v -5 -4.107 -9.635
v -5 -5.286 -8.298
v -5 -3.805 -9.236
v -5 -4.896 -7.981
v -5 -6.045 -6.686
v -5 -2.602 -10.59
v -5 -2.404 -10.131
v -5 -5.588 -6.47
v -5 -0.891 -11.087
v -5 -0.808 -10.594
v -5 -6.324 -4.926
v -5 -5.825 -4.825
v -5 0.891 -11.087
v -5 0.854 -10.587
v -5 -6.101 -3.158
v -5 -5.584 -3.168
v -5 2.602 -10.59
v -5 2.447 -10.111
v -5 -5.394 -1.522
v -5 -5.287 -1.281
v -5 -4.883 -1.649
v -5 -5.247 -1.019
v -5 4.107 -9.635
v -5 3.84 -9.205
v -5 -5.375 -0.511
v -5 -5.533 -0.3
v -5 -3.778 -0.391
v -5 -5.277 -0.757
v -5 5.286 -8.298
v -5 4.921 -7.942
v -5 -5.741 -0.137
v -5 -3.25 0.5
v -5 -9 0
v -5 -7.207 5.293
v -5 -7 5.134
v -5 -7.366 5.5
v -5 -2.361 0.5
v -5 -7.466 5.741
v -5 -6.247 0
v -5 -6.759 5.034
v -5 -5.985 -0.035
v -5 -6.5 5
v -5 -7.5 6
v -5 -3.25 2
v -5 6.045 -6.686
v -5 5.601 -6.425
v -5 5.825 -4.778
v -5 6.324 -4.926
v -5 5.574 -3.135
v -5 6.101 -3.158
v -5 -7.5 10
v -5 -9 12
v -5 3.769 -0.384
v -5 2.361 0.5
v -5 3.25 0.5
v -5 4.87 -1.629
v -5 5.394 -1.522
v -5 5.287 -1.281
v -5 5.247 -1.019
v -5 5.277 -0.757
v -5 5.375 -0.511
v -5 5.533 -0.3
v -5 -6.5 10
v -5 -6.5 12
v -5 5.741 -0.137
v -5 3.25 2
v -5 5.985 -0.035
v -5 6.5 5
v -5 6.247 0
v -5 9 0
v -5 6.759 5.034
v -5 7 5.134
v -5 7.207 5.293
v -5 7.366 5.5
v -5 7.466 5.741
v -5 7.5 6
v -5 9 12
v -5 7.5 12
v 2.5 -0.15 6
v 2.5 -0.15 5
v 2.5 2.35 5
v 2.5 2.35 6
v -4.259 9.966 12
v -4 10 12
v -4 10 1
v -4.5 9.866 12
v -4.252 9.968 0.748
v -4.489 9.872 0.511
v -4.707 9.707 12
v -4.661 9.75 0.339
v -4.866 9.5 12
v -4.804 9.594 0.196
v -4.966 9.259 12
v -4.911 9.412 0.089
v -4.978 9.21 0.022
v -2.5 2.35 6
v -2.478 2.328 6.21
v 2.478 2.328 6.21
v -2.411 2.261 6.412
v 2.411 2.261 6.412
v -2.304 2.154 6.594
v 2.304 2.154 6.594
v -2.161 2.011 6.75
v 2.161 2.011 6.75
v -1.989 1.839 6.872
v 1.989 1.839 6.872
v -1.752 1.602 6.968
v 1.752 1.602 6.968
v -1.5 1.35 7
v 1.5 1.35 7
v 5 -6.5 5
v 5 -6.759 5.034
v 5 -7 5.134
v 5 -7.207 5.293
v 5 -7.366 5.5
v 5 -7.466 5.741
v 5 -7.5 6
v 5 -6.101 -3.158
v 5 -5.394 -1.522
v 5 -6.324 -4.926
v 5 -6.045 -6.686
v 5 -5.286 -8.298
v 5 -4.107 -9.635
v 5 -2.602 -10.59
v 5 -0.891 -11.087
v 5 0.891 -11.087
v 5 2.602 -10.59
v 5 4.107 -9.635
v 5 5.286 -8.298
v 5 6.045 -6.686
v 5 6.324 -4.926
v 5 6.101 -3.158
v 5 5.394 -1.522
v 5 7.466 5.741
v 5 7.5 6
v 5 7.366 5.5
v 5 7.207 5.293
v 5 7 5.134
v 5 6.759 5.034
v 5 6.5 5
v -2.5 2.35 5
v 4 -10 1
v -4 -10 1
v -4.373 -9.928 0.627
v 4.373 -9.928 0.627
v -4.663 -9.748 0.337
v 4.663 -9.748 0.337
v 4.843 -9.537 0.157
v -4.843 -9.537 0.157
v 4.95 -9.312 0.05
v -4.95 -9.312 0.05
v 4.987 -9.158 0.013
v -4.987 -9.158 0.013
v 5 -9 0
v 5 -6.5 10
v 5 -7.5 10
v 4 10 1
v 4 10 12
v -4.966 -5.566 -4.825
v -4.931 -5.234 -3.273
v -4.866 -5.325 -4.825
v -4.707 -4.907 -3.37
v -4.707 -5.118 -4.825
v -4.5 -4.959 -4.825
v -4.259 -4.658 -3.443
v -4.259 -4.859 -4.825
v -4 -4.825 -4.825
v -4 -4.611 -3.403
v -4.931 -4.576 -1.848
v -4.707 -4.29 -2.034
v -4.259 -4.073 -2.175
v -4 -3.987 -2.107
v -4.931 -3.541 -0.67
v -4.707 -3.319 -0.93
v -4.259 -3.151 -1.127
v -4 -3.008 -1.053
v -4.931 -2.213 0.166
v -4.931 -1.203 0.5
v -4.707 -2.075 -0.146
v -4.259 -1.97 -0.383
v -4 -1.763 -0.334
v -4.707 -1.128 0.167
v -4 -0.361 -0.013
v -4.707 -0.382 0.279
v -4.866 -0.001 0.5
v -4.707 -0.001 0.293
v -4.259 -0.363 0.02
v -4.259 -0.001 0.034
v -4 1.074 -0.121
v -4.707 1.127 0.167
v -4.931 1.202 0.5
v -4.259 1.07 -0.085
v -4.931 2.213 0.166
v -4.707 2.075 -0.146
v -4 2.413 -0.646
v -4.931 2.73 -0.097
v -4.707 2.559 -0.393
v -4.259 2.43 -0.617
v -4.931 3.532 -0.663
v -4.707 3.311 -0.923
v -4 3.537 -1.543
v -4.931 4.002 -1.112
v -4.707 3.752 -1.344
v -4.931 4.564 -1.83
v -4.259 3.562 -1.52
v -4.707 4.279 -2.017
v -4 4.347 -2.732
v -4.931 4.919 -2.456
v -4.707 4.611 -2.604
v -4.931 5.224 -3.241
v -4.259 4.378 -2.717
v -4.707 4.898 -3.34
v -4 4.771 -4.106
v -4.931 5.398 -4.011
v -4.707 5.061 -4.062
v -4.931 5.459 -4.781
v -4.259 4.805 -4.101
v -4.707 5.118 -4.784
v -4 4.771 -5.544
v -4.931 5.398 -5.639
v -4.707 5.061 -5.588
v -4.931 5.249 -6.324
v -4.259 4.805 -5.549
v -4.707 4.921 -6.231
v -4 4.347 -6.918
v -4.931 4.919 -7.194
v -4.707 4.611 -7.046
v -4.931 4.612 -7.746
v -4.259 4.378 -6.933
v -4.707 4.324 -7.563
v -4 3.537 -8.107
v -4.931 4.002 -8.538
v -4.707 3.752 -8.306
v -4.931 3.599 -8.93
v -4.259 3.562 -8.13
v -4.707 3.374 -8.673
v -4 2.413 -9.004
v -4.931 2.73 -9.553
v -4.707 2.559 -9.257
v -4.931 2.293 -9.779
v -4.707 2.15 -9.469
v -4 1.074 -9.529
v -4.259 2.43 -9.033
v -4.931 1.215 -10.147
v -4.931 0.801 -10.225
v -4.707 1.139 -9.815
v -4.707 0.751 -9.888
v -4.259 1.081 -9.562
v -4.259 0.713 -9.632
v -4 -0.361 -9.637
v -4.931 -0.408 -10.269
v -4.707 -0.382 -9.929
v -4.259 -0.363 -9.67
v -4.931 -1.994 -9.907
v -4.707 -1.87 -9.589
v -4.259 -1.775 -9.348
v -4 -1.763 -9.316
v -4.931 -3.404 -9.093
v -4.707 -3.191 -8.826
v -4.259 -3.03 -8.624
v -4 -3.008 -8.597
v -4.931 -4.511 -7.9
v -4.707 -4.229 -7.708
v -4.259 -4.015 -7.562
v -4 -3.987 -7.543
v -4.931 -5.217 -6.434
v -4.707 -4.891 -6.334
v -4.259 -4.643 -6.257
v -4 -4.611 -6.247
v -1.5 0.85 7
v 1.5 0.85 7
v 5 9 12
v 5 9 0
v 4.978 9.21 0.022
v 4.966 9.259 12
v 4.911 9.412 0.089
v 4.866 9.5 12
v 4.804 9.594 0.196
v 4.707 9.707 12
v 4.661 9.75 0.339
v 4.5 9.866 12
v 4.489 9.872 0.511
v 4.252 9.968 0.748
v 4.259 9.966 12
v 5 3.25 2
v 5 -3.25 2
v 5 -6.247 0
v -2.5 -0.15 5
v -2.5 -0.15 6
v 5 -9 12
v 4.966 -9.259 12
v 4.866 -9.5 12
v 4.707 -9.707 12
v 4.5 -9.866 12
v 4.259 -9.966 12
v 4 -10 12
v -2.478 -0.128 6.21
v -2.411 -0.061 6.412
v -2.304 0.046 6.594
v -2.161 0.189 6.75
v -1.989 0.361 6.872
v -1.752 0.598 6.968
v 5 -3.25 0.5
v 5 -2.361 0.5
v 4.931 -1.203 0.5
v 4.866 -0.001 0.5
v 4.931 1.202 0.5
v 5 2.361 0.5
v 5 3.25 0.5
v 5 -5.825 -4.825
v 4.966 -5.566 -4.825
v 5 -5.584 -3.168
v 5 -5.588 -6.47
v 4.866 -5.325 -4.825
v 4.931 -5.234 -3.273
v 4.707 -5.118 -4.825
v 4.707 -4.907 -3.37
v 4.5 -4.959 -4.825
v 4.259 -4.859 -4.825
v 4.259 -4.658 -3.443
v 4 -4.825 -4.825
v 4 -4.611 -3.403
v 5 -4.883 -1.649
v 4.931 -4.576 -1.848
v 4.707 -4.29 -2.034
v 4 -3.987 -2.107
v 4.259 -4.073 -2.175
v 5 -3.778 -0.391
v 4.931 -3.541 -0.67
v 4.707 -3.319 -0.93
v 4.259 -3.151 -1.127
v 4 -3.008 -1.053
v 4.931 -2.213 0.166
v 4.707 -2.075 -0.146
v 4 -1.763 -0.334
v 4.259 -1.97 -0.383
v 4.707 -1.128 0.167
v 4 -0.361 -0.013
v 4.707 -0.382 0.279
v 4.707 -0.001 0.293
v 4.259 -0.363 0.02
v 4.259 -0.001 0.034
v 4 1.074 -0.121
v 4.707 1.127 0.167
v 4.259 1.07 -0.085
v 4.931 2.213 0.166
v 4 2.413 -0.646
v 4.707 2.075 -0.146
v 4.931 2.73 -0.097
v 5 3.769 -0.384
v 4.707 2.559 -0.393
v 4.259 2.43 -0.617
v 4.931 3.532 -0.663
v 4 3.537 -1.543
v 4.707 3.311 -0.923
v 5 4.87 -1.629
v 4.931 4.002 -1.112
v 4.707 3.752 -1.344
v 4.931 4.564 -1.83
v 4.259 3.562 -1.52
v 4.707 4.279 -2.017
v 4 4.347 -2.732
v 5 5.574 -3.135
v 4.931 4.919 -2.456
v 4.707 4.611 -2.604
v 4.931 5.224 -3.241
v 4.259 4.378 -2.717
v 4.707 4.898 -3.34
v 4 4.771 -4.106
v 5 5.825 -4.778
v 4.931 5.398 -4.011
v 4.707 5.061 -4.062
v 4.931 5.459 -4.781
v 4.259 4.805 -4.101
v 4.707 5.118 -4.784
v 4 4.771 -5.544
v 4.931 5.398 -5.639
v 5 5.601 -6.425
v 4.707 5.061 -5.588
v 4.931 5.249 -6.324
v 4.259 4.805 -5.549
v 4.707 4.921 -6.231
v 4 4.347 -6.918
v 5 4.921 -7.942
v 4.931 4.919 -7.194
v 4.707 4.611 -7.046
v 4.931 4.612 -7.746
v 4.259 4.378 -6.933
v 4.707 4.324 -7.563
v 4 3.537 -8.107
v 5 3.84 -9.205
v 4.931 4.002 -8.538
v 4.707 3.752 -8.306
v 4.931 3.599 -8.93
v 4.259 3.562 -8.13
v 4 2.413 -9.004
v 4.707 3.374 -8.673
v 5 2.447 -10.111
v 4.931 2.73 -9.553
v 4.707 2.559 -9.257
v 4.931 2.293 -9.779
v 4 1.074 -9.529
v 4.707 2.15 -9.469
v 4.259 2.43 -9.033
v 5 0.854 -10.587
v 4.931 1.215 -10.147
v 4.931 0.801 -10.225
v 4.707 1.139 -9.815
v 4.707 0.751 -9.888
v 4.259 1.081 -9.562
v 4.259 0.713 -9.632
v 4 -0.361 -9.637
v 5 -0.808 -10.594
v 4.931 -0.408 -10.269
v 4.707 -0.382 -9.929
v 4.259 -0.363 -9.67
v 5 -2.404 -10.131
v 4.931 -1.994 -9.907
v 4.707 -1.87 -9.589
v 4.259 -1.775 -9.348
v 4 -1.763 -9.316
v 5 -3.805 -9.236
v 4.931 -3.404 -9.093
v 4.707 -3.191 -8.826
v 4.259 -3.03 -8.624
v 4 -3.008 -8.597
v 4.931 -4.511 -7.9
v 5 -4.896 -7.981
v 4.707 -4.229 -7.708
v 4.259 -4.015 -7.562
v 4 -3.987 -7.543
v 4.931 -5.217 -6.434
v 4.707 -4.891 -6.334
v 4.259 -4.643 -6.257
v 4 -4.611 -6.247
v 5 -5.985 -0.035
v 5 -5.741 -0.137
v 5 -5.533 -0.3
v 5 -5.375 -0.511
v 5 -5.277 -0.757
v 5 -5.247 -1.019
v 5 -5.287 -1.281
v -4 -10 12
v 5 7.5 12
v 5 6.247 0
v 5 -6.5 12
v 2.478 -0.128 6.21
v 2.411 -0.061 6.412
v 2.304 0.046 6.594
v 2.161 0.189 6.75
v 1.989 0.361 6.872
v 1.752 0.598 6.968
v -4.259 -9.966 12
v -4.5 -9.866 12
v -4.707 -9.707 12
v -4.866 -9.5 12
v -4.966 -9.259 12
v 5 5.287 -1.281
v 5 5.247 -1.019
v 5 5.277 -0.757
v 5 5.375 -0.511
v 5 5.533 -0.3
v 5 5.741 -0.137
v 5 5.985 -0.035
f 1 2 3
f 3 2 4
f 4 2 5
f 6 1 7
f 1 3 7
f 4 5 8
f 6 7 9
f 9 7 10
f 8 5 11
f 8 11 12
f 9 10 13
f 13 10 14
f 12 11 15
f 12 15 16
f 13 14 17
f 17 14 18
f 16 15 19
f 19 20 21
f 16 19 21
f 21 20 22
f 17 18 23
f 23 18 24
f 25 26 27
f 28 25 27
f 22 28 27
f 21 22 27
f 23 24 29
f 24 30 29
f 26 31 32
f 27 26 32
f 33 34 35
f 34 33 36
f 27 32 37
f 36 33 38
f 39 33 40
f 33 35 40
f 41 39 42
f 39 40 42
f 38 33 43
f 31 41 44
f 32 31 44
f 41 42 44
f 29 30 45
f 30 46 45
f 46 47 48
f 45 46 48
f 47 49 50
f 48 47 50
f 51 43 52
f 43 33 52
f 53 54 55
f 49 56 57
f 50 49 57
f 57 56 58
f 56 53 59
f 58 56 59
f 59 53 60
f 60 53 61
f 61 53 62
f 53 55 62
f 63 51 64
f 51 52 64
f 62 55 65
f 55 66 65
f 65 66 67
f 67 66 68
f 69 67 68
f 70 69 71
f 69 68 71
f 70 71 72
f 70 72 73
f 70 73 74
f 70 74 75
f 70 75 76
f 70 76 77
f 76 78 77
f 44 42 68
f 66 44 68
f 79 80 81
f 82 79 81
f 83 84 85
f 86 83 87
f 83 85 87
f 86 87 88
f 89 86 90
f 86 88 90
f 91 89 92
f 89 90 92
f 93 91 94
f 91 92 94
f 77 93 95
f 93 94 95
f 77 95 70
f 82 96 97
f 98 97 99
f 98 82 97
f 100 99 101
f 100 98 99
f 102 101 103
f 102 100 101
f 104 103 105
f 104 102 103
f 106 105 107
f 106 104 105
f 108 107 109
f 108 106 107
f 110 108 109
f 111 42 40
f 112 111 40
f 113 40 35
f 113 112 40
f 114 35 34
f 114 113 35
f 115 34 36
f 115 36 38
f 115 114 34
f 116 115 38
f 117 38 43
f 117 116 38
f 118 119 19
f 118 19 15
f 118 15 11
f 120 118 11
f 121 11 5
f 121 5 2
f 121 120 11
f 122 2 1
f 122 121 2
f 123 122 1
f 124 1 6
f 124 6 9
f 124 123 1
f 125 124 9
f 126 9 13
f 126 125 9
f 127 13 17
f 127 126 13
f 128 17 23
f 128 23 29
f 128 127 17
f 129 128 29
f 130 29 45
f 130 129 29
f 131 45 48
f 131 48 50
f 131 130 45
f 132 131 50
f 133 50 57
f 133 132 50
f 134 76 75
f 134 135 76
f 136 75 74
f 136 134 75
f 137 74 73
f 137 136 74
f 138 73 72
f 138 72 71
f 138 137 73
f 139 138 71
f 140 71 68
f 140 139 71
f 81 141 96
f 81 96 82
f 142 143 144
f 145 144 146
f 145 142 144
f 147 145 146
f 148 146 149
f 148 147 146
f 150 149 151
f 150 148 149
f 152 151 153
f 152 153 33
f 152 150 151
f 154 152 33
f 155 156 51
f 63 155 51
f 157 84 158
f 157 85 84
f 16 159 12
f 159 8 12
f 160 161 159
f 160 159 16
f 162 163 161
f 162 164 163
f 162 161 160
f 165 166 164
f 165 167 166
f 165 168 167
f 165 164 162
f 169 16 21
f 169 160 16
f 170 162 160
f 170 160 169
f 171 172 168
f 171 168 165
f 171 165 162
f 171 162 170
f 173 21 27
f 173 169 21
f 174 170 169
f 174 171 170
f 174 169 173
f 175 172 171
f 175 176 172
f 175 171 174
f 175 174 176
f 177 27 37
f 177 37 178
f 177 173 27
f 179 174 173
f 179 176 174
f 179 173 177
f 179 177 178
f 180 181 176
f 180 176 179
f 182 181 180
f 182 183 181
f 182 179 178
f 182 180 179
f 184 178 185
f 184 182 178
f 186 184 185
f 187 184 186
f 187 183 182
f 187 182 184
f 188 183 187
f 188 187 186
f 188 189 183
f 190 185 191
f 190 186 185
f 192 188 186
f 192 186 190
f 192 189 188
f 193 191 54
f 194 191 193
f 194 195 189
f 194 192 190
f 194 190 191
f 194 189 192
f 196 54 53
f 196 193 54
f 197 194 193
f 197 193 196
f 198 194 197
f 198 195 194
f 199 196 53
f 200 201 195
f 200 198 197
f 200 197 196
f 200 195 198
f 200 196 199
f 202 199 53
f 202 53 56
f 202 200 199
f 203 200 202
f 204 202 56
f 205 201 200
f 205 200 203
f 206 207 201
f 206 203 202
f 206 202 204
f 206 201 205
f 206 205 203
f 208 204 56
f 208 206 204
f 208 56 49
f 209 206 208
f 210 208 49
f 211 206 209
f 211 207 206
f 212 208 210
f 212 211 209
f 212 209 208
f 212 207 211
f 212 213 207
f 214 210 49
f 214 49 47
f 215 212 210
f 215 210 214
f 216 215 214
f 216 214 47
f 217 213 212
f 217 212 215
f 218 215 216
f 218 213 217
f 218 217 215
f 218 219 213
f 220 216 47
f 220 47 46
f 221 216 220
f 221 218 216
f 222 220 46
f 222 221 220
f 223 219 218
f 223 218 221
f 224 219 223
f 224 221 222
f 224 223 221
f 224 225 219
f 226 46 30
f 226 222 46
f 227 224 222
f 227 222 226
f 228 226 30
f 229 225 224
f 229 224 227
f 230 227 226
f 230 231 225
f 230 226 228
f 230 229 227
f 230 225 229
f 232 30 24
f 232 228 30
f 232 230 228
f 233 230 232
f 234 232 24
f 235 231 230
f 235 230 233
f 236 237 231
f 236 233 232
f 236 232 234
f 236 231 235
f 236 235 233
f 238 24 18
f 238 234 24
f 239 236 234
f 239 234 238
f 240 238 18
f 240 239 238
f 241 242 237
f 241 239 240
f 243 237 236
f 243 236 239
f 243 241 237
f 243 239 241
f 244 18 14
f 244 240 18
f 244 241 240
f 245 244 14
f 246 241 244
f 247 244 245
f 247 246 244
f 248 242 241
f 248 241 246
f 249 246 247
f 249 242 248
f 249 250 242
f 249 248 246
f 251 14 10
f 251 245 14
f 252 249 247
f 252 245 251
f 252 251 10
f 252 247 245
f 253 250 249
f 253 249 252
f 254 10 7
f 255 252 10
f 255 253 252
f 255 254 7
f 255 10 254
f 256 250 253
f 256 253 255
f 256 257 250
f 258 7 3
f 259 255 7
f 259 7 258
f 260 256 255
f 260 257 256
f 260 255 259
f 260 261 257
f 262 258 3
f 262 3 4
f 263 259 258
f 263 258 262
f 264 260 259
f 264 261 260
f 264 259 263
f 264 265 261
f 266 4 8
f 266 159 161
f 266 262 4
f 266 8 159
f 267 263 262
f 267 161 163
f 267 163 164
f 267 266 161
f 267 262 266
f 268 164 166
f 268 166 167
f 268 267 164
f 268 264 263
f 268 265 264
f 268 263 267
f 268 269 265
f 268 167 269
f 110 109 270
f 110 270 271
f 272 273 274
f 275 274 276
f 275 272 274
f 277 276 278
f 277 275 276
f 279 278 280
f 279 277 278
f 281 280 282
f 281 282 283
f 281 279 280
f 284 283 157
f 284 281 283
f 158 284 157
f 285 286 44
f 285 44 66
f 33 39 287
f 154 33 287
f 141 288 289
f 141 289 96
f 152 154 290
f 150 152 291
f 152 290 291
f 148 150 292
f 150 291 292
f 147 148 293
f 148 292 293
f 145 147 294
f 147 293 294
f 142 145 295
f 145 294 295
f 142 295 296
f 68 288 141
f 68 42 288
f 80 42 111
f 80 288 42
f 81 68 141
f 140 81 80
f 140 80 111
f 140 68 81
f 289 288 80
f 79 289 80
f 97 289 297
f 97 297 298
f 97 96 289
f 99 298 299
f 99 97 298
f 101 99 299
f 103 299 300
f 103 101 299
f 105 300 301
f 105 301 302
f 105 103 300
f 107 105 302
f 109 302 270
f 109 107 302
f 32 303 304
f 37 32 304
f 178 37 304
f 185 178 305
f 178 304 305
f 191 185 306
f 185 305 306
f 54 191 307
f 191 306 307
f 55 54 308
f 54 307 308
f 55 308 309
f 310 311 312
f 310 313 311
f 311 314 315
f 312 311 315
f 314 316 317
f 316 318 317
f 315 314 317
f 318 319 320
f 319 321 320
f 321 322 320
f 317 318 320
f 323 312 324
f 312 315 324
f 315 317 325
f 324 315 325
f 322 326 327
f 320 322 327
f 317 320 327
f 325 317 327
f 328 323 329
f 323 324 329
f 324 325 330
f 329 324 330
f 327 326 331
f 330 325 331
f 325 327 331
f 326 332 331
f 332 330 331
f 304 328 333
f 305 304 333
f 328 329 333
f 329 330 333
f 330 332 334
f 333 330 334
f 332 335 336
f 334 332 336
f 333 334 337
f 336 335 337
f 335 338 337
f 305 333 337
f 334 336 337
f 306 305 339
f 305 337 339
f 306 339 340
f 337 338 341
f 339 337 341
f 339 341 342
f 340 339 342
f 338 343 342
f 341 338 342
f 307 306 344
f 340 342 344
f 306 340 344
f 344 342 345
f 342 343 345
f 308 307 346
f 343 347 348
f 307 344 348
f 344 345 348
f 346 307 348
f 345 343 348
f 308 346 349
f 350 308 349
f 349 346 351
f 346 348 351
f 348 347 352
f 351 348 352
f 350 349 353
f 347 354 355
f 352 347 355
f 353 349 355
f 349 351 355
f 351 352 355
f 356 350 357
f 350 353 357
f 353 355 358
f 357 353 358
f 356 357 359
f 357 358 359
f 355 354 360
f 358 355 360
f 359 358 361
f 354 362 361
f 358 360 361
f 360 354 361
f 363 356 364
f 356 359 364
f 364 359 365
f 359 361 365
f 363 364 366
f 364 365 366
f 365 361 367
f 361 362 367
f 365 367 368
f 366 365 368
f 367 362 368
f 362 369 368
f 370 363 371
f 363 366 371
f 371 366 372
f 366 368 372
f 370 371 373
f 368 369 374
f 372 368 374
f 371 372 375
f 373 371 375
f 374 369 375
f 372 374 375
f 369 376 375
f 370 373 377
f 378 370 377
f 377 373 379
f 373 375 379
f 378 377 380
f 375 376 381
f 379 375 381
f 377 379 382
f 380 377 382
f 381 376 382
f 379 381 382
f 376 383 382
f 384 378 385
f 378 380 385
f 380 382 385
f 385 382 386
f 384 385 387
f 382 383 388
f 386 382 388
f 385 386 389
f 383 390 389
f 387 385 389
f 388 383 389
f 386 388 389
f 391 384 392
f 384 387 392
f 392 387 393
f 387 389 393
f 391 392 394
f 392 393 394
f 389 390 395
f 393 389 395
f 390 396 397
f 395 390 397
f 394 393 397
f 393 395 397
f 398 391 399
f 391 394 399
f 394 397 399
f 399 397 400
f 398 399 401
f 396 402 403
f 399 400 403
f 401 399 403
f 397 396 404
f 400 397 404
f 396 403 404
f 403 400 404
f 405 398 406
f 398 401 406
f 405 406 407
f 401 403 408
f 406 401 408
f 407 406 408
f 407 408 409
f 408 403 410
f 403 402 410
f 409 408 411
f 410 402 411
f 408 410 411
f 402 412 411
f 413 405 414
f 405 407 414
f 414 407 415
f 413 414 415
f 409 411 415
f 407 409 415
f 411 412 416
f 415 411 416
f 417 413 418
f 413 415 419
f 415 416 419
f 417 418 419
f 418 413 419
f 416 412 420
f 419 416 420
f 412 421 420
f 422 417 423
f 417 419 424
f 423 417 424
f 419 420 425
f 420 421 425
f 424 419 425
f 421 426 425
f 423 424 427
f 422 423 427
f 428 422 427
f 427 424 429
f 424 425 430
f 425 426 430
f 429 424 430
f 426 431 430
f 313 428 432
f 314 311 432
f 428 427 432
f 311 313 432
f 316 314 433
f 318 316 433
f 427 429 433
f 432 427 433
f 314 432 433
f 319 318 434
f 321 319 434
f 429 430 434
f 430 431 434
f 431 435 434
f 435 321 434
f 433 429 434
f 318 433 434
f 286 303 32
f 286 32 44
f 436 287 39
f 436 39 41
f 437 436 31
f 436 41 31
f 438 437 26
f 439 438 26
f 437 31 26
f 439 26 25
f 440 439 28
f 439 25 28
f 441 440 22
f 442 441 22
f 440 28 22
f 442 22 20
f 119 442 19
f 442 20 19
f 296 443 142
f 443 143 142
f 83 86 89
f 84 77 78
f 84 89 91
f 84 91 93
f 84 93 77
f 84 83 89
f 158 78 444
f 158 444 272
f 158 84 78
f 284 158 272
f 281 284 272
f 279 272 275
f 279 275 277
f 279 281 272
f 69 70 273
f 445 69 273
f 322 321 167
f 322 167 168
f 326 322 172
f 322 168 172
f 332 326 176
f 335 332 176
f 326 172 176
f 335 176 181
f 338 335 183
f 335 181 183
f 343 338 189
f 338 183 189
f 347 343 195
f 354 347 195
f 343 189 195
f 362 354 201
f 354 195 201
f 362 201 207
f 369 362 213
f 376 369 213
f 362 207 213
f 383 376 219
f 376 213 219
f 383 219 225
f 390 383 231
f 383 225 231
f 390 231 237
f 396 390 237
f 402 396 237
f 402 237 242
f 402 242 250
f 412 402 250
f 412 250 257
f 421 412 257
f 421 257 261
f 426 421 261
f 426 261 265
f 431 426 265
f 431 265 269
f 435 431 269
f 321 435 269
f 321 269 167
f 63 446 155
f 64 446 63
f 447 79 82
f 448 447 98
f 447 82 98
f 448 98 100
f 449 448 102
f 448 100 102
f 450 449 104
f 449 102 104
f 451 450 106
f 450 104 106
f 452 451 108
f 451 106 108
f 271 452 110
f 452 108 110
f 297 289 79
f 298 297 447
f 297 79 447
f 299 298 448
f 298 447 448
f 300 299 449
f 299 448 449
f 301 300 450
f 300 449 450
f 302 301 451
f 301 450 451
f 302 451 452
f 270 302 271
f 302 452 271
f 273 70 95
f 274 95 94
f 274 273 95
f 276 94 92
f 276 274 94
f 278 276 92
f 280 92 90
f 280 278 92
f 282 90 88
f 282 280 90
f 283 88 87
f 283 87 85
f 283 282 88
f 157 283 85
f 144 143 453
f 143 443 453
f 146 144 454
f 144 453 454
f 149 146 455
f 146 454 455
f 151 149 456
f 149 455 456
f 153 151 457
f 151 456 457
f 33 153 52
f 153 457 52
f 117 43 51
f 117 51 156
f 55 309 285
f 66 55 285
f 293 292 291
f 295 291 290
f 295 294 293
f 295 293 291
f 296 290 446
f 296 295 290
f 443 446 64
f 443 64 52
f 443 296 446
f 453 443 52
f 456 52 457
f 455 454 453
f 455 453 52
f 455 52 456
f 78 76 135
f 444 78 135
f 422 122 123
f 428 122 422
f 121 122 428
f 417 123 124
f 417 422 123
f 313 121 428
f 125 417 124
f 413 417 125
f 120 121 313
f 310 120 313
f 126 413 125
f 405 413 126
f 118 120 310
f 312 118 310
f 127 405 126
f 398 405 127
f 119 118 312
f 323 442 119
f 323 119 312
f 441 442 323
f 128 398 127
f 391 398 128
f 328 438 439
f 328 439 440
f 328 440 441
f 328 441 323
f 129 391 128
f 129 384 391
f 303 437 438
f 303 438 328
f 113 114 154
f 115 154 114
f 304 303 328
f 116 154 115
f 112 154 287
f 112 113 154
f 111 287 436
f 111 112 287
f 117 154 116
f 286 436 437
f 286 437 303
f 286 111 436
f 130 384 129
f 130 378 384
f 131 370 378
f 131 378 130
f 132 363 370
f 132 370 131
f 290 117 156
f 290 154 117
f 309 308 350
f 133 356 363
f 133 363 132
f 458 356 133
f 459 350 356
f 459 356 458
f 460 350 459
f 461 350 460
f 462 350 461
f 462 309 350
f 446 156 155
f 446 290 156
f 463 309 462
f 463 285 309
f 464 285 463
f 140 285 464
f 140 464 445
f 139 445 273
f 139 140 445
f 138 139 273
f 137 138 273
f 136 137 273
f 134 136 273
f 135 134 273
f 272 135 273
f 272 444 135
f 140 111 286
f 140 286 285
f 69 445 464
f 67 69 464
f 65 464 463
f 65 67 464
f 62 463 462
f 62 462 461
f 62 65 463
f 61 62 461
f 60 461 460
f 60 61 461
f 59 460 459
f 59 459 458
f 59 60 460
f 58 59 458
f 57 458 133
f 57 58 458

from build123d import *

# Parameters (mm, degrees)
F0_W         = 10
F0_H         = 20
F1_DEPTH     = 5
F2_W         = 10
F2_H         = 2.5
F3_DEPTH     = 7
F4_W         = 10
F4_H         = 2
F5_DEPTH     = 1
F6_W         = 5
F6_H         = 2.5
F7_DEPTH     = 2
F8_R         = 1
F9_W         = 6.5
F9_H         = 1.5
F10_DEPTH    = 10.001
F12_DEPTH    = 5
F13_R        = 4.825
F14_DEPTH    = 10.001
F15_T1_DEPTH = 10


# Not quite as in the source:
# - a fillet or chamfer that OpenCascade refuses, or shapes differently, is made with other operations: its cross-section is extruded or revolved along the edge and cut away or added


with BuildPart() as f1:
    # F0 (on Top) → F1 (new body)
    with BuildSketch(Plane.XY):
        Rectangle(F0_W, F0_H)
    extrude(amount=F1_DEPTH)

    # F2 (on face) → F3 (join)
    with BuildSketch(Plane.XY.offset(5)):
        with Locations((0, -8.75)):
            Rectangle(F2_W, F2_H)
        with Locations((0, 8.75)):
            Rectangle(F2_W, F2_H)
    extrude(amount=F3_DEPTH)

    # F4 (on face) → F5 (join)
    with BuildSketch(Plane(origin=(0, -7.5, 0), x_dir=(-1, 0, 0), z_dir=(0, 1, 0))):
        with Locations((0, 11)):
            Rectangle(F4_W, F4_H)
    extrude(amount=F5_DEPTH)

    # F6 (on face) → F7 (join)
    with BuildSketch(Plane.XY.offset(5)):
        with Locations((0, 1.1)):
            Rectangle(F6_W, F6_H)
    extrude(amount=F7_DEPTH)

    # F8
    f8_edges = [f1.edges().sort_by_distance(p)[0] for p in [
        (0, 7.5, 5),
        (0, -7.5, 5),
        (0, 10, 0),
        (0, -10, 0),
        (5, -10, 6),
        (-5, -10, 6),
        (5, 10, 6),
        (-5, 10, 6),
        (2.5, 1.1, 7),
        (0, 2.35, 7),
        (-2.5, 1.1, 7),
        (0, -0.15, 7),
    ]]
    fillet(f8_edges, radius=F8_R)

    # F9 (on face) → F10 (cut, through all)
    with BuildSketch(Plane.YZ.offset(5)):
        with Locations((0, 1.25)):
            Rectangle(F9_W, F9_H)
    extrude(amount=-F10_DEPTH, mode=Mode.SUBTRACT)

    # F11 (on Right) → F12 (join, symmetric)
    with BuildSketch(Plane.YZ):
        with BuildLine():
            Line((4.0896210093, 0), (0, 0))
            Line((0, 0), (-4.0896210093, 0))
            ThreePointArc((-4.0896210093, 0), (0, -11.15), (4.0896210093, 0))
        make_face()
        with BuildLine():
            ThreePointArc((0, 0), (3.4117902192, -1.4132097808), (4.825, -4.825))
            ThreePointArc((4.825, -4.825), (-3.4117902192, -8.2367902192), (0, 0))
        make_face(mode=Mode.SUBTRACT)
        with BuildLine():
            ThreePointArc((0, 0), (-3.4117902192, -8.2367902192), (4.825, -4.825))
            ThreePointArc((4.825, -4.825), (3.4117902192, -1.4132097808), (0, 0))
        make_face()
    extrude(amount=F12_DEPTH, both=True)

    # F13 (on face) → F14 (cut, through all)
    with BuildSketch(Plane(origin=(-5, 0, 0), x_dir=(0, -1, 0), z_dir=(-1, 0, 0))):
        with Locations((0, -4.825)):
            Circle(F13_R)
    extrude(amount=-F14_DEPTH, mode=Mode.SUBTRACT)

    # F15: fillet of radius 1 on 4 edges, made by hand

    # F15_s2 → F15_t1 (join)
    with BuildSketch(Plane.YZ.offset(-5)):
        with BuildLine():
            ThreePointArc((-6.2469992797, 0), (-5.3745933247, -0.5112179935), (-5.3941666135, -1.5221843003))
            ThreePointArc((-5.3941666135, -1.5221843003), (-4.8025845312, -0.7090788613), (-4.0896210093, 0))
            Line((-4.0896210093, 0), (-6.2469992797, 0))
        make_face()
        with BuildLine():
            ThreePointArc((6.2469992797, 0), (5.3745933247, -0.5112179935), (5.3941666135, -1.5221843003))
            ThreePointArc((5.3941666135, -1.5221843003), (4.8025845312, -0.7090788613), (4.0896210093, 0))
            Line((4.0896210093, 0), (6.2469992797, 0))
        make_face()
    extrude(amount=F15_T1_DEPTH)

    # F15_s3 → F15_t4 (revolve, cut)
    with BuildSketch(Plane.XY.offset(-4.825)):
        with BuildLine():
            ThreePointArc((-5, -5.825), (-4.7071067812, -5.1178932188), (-4, -4.825))
            Line((-4, -4.825), (-5, -4.825))
            Line((-5, -4.825), (-5, -5.825))
        make_face()
    revolve(axis=Axis((-5, 0, -4.825), (-1, 0, 0)), mode=Mode.SUBTRACT)

    # F15_s5 → F15_t6 (revolve, cut)
    with BuildSketch(Plane.XY.offset(-4.825)):
        with BuildLine():
            ThreePointArc((5, -5.825), (4.7071067812, -5.1178932188), (4, -4.825))
            Line((4, -4.825), (5, -4.825))
            Line((5, -4.825), (5, -5.825))
        make_face()
    revolve(axis=Axis((5, 0, -4.825), (-1, 0, 0)), mode=Mode.SUBTRACT)


solid = f1.part
